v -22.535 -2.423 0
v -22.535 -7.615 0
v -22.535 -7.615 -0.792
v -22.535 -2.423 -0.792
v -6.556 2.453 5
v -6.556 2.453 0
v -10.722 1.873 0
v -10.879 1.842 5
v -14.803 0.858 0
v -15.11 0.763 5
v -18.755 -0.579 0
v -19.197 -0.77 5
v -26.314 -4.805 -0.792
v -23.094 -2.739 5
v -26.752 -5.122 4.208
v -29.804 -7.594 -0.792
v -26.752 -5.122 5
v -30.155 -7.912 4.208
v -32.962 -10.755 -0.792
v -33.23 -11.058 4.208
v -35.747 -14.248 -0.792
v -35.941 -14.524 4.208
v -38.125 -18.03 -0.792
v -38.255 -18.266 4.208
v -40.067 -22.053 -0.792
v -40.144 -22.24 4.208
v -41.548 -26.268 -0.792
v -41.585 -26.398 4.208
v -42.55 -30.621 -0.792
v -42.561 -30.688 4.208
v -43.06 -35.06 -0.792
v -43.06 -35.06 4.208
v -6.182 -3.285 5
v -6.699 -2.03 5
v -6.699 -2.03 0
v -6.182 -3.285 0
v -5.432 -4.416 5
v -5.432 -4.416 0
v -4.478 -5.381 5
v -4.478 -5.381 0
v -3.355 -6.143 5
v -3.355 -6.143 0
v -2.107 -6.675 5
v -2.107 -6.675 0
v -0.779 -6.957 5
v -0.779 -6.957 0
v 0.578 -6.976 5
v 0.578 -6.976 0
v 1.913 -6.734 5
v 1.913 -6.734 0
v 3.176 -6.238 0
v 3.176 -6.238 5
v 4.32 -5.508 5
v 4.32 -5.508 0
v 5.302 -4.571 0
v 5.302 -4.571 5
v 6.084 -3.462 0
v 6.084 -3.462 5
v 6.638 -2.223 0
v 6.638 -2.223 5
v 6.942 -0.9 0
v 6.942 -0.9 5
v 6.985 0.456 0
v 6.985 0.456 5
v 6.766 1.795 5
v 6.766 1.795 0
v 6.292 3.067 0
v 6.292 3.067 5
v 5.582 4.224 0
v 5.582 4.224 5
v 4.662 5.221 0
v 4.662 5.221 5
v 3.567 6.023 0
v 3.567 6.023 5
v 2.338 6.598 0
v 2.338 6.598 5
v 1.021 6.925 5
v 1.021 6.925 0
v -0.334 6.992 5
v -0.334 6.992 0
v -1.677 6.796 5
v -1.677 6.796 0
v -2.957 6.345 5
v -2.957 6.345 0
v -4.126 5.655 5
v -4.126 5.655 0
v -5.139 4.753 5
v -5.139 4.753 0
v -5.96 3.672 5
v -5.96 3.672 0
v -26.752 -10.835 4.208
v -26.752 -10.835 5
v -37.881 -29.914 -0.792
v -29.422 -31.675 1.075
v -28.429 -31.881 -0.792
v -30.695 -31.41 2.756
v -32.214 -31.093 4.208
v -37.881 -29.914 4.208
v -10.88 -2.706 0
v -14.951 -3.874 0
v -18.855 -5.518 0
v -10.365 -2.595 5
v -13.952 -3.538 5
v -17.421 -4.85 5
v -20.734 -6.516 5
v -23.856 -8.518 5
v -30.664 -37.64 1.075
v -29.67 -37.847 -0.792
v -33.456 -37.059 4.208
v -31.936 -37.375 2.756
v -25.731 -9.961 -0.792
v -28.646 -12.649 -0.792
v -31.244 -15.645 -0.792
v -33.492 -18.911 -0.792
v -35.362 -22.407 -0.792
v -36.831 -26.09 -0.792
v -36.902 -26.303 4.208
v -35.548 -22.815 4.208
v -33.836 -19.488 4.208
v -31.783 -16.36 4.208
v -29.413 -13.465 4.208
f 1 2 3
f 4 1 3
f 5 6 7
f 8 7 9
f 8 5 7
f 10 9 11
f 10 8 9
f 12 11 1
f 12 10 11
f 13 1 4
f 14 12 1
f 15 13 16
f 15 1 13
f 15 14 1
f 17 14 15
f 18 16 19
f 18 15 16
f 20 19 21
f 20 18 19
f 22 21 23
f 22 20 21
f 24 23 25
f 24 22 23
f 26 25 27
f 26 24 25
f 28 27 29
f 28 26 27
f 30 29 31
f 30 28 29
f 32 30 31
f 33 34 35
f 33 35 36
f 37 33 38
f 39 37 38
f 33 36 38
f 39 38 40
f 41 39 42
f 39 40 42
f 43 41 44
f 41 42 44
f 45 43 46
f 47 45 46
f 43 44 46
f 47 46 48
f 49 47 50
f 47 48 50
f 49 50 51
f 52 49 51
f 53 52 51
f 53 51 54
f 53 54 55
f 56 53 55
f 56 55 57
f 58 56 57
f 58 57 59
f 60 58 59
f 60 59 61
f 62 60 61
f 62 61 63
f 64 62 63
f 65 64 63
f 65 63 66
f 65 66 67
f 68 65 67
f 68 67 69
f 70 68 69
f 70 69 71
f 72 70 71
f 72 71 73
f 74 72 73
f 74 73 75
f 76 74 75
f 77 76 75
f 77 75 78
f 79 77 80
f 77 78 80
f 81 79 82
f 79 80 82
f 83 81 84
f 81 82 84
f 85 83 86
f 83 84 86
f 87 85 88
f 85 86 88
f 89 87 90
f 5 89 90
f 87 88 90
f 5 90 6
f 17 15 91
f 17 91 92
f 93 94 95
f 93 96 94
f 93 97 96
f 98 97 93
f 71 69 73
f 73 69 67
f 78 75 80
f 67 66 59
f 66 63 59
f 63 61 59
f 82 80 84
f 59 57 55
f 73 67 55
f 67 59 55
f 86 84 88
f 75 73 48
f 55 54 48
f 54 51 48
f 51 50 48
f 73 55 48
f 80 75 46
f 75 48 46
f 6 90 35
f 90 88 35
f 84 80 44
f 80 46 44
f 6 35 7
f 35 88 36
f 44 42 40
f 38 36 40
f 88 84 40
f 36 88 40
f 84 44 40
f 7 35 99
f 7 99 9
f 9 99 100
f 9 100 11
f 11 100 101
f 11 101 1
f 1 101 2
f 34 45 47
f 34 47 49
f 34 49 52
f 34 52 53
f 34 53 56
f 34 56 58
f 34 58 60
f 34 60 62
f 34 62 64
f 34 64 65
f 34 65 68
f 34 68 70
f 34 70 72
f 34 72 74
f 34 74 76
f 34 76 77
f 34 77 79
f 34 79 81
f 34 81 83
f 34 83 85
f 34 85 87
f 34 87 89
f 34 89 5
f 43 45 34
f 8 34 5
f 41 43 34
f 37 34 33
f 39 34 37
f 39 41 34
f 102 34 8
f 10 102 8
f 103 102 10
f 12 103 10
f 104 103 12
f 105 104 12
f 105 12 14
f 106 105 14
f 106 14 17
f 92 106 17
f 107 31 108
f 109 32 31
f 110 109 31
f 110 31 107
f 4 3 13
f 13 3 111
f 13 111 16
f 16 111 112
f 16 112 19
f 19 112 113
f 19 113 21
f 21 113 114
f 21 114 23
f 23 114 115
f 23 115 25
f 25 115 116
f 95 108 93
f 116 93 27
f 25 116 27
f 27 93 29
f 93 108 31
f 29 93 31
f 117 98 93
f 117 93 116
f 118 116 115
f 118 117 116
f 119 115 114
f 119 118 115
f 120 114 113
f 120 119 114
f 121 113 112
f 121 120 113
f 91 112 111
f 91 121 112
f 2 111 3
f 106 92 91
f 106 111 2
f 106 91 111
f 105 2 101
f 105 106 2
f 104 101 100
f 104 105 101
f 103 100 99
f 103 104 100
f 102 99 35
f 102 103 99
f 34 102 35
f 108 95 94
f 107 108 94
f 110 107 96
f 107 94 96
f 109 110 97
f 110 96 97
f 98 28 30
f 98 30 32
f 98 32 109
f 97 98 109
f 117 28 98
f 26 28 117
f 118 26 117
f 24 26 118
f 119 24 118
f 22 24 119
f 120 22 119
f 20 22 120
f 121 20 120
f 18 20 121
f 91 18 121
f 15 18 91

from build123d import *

# Parameters (mm, degrees)
BOSS_EXTRU_2_DEPTH      = 5
BOSS_EXTRU_3_DEPTH      = 45
ENL_V_START             = -73.880031702
ENL_V_MAT_EXTRU_3_DEPTH = 78.880031702
ESQUISSE4_4_W           = 16.307493561
ESQUISSE4_4_H           = 0.792049354
ENL_V_MAT_EXTRU_4_DEPTH = 58.619847767
ENL_V_MAT_EXTRU_6_DEPTH = 57.248456757
ENL_V_MAT_EXTRU_7_DEPTH = 58.619847767


with BuildPart() as part:
    # Esquisse3 → Boss.-Extru.2 (new body)
    with BuildSketch(Plane.XY):
        with BuildLine():
            ThreePointArc((7, 0), (1.246257582, 6.888166813), (-6.556240583, 2.452694319))
            ThreePointArc((-6.556240583, 2.452694319), (-6.99644453, 0.22307834), (-6.699170831, -2.030051767))
            ThreePointArc((-6.699170831, -2.030051767), (1.026110175, -6.924384298), (7, 0))
        make_face()
    extrude(amount=BOSS_EXTRU_2_DEPTH)

    # Esquisse3<3> → Boss.-Extru.3 (add)
    with BuildSketch(Plane.XY):
        with BuildLine():
            ThreePointArc((-6.556240583, 2.452694319), (-31.795381091, -9.503990443), (-43.059714875, -35.059641647))
            Line((-43.059714875, -35.059641647), (-29.67043681, -37.846531887))
            Line((-29.67043681, -37.846531887), (-28.42882324, -31.881349224))
            Line((-28.42882324, -31.881349224), (-37.880972605, -29.913946449))
            ThreePointArc((-37.880972605, -29.913946449), (-26.825365644, -10.900303142), (-6.699170831, -2.030051767))
            ThreePointArc((-6.699170831, -2.030051767), (-6.99644453, 0.22307834), (-6.556240583, 2.452694319))
        make_face()
    boss_extru_3 = extrude(amount=BOSS_EXTRU_3_DEPTH)

    # Esquisse4 → Enlèv. mat.-Extru.3 (cut)
    with BuildSketch(Plane(origin=(0, 0, 0), x_dir=(1, 0, 0), z_dir=(0, 1, 0)).offset(ENL_V_START)):
        Polygon((-6.556240583, -21.643777245), (-6.556240583, -5), (-22.534905521, -5), (-22.534905521, -5.792049354), (-43.059714875, -5.792049354), (-43.059714875, -11.918484986), (-43.059714875, -45), (-43.059714875, -53.527020644), (-6.425184121, -53.527020644), align=None)
    enl_v_mat_extru_3 = extrude(amount=ENL_V_MAT_EXTRU_3_DEPTH, mode=Mode.SUBTRACT)

    # Esquisse4<4> → Enlèv. mat.-Extru.4 (cut, through all)
    with BuildSketch(Plane(origin=(0, 0, 0), x_dir=(1, 0, 0), z_dir=(0, 1, 0))):
        with Locations((-34.905968095, -0.396024677)):
            Rectangle(ESQUISSE4_4_W, ESQUISSE4_4_H)
    enl_v_mat_extru_4 = extrude(amount=-ENL_V_MAT_EXTRU_4_DEPTH, mode=Mode.SUBTRACT)

    # Esquisse5 → Enlèv. mat.-Extru.6 (cut, through all)
    with BuildSketch(Plane(origin=(-7.540837864, -36.229046112, 0), x_dir=(0.9790175257089632, -0.2037760642340011, 0), z_dir=(0.2037760642340011, 0.9790175257089632, 0))):
        with BuildLine():
            Line((-25.202181908, -0.792049354), (-21.33566032, -0.792049354))
            Line((-21.33566032, -0.792049354), (-21.33566032, -5.792049354))
            ThreePointArc((-21.33566032, -5.792049354), (-22.966477925, -3.05816873), (-25.202181908, -0.792049354))
        make_face()
    enl_v_mat_extru_6 = extrude(amount=-ENL_V_MAT_EXTRU_6_DEPTH, mode=Mode.SUBTRACT)

    # Symétrie1: Boss.-Extru.3, Enlèv. mat.-Extru.3, Enlèv. mat.-Extru.4, Enlèv. mat.-Extru.6 across plane
    add(boss_extru_3.mirror(Plane.XY.offset(2.5)))
    add(enl_v_mat_extru_3.mirror(Plane.XY.offset(2.5)), mode=Mode.SUBTRACT)
    add(enl_v_mat_extru_4.mirror(Plane.XY.offset(2.5)), mode=Mode.SUBTRACT)
    add(enl_v_mat_extru_6.mirror(Plane.XY.offset(2.5)), mode=Mode.SUBTRACT)

    # Esquisse6 → Enlèv. mat.-Extru.7 (cut, through all)
    with BuildSketch(Plane(origin=(0, 0, 0), x_dir=(1, 0, 0), z_dir=(0, 1, 0))):
        Polygon((-22.534905521, -1196.824915859), (-22.534905521, -5), (-43.059714875, -5), (-43.059714875, -5.792049354), (-28.70402214, -5.792049354), align=None)
    extrude(amount=-ENL_V_MAT_EXTRU_7_DEPTH, mode=Mode.SUBTRACT)


solid = part.part
